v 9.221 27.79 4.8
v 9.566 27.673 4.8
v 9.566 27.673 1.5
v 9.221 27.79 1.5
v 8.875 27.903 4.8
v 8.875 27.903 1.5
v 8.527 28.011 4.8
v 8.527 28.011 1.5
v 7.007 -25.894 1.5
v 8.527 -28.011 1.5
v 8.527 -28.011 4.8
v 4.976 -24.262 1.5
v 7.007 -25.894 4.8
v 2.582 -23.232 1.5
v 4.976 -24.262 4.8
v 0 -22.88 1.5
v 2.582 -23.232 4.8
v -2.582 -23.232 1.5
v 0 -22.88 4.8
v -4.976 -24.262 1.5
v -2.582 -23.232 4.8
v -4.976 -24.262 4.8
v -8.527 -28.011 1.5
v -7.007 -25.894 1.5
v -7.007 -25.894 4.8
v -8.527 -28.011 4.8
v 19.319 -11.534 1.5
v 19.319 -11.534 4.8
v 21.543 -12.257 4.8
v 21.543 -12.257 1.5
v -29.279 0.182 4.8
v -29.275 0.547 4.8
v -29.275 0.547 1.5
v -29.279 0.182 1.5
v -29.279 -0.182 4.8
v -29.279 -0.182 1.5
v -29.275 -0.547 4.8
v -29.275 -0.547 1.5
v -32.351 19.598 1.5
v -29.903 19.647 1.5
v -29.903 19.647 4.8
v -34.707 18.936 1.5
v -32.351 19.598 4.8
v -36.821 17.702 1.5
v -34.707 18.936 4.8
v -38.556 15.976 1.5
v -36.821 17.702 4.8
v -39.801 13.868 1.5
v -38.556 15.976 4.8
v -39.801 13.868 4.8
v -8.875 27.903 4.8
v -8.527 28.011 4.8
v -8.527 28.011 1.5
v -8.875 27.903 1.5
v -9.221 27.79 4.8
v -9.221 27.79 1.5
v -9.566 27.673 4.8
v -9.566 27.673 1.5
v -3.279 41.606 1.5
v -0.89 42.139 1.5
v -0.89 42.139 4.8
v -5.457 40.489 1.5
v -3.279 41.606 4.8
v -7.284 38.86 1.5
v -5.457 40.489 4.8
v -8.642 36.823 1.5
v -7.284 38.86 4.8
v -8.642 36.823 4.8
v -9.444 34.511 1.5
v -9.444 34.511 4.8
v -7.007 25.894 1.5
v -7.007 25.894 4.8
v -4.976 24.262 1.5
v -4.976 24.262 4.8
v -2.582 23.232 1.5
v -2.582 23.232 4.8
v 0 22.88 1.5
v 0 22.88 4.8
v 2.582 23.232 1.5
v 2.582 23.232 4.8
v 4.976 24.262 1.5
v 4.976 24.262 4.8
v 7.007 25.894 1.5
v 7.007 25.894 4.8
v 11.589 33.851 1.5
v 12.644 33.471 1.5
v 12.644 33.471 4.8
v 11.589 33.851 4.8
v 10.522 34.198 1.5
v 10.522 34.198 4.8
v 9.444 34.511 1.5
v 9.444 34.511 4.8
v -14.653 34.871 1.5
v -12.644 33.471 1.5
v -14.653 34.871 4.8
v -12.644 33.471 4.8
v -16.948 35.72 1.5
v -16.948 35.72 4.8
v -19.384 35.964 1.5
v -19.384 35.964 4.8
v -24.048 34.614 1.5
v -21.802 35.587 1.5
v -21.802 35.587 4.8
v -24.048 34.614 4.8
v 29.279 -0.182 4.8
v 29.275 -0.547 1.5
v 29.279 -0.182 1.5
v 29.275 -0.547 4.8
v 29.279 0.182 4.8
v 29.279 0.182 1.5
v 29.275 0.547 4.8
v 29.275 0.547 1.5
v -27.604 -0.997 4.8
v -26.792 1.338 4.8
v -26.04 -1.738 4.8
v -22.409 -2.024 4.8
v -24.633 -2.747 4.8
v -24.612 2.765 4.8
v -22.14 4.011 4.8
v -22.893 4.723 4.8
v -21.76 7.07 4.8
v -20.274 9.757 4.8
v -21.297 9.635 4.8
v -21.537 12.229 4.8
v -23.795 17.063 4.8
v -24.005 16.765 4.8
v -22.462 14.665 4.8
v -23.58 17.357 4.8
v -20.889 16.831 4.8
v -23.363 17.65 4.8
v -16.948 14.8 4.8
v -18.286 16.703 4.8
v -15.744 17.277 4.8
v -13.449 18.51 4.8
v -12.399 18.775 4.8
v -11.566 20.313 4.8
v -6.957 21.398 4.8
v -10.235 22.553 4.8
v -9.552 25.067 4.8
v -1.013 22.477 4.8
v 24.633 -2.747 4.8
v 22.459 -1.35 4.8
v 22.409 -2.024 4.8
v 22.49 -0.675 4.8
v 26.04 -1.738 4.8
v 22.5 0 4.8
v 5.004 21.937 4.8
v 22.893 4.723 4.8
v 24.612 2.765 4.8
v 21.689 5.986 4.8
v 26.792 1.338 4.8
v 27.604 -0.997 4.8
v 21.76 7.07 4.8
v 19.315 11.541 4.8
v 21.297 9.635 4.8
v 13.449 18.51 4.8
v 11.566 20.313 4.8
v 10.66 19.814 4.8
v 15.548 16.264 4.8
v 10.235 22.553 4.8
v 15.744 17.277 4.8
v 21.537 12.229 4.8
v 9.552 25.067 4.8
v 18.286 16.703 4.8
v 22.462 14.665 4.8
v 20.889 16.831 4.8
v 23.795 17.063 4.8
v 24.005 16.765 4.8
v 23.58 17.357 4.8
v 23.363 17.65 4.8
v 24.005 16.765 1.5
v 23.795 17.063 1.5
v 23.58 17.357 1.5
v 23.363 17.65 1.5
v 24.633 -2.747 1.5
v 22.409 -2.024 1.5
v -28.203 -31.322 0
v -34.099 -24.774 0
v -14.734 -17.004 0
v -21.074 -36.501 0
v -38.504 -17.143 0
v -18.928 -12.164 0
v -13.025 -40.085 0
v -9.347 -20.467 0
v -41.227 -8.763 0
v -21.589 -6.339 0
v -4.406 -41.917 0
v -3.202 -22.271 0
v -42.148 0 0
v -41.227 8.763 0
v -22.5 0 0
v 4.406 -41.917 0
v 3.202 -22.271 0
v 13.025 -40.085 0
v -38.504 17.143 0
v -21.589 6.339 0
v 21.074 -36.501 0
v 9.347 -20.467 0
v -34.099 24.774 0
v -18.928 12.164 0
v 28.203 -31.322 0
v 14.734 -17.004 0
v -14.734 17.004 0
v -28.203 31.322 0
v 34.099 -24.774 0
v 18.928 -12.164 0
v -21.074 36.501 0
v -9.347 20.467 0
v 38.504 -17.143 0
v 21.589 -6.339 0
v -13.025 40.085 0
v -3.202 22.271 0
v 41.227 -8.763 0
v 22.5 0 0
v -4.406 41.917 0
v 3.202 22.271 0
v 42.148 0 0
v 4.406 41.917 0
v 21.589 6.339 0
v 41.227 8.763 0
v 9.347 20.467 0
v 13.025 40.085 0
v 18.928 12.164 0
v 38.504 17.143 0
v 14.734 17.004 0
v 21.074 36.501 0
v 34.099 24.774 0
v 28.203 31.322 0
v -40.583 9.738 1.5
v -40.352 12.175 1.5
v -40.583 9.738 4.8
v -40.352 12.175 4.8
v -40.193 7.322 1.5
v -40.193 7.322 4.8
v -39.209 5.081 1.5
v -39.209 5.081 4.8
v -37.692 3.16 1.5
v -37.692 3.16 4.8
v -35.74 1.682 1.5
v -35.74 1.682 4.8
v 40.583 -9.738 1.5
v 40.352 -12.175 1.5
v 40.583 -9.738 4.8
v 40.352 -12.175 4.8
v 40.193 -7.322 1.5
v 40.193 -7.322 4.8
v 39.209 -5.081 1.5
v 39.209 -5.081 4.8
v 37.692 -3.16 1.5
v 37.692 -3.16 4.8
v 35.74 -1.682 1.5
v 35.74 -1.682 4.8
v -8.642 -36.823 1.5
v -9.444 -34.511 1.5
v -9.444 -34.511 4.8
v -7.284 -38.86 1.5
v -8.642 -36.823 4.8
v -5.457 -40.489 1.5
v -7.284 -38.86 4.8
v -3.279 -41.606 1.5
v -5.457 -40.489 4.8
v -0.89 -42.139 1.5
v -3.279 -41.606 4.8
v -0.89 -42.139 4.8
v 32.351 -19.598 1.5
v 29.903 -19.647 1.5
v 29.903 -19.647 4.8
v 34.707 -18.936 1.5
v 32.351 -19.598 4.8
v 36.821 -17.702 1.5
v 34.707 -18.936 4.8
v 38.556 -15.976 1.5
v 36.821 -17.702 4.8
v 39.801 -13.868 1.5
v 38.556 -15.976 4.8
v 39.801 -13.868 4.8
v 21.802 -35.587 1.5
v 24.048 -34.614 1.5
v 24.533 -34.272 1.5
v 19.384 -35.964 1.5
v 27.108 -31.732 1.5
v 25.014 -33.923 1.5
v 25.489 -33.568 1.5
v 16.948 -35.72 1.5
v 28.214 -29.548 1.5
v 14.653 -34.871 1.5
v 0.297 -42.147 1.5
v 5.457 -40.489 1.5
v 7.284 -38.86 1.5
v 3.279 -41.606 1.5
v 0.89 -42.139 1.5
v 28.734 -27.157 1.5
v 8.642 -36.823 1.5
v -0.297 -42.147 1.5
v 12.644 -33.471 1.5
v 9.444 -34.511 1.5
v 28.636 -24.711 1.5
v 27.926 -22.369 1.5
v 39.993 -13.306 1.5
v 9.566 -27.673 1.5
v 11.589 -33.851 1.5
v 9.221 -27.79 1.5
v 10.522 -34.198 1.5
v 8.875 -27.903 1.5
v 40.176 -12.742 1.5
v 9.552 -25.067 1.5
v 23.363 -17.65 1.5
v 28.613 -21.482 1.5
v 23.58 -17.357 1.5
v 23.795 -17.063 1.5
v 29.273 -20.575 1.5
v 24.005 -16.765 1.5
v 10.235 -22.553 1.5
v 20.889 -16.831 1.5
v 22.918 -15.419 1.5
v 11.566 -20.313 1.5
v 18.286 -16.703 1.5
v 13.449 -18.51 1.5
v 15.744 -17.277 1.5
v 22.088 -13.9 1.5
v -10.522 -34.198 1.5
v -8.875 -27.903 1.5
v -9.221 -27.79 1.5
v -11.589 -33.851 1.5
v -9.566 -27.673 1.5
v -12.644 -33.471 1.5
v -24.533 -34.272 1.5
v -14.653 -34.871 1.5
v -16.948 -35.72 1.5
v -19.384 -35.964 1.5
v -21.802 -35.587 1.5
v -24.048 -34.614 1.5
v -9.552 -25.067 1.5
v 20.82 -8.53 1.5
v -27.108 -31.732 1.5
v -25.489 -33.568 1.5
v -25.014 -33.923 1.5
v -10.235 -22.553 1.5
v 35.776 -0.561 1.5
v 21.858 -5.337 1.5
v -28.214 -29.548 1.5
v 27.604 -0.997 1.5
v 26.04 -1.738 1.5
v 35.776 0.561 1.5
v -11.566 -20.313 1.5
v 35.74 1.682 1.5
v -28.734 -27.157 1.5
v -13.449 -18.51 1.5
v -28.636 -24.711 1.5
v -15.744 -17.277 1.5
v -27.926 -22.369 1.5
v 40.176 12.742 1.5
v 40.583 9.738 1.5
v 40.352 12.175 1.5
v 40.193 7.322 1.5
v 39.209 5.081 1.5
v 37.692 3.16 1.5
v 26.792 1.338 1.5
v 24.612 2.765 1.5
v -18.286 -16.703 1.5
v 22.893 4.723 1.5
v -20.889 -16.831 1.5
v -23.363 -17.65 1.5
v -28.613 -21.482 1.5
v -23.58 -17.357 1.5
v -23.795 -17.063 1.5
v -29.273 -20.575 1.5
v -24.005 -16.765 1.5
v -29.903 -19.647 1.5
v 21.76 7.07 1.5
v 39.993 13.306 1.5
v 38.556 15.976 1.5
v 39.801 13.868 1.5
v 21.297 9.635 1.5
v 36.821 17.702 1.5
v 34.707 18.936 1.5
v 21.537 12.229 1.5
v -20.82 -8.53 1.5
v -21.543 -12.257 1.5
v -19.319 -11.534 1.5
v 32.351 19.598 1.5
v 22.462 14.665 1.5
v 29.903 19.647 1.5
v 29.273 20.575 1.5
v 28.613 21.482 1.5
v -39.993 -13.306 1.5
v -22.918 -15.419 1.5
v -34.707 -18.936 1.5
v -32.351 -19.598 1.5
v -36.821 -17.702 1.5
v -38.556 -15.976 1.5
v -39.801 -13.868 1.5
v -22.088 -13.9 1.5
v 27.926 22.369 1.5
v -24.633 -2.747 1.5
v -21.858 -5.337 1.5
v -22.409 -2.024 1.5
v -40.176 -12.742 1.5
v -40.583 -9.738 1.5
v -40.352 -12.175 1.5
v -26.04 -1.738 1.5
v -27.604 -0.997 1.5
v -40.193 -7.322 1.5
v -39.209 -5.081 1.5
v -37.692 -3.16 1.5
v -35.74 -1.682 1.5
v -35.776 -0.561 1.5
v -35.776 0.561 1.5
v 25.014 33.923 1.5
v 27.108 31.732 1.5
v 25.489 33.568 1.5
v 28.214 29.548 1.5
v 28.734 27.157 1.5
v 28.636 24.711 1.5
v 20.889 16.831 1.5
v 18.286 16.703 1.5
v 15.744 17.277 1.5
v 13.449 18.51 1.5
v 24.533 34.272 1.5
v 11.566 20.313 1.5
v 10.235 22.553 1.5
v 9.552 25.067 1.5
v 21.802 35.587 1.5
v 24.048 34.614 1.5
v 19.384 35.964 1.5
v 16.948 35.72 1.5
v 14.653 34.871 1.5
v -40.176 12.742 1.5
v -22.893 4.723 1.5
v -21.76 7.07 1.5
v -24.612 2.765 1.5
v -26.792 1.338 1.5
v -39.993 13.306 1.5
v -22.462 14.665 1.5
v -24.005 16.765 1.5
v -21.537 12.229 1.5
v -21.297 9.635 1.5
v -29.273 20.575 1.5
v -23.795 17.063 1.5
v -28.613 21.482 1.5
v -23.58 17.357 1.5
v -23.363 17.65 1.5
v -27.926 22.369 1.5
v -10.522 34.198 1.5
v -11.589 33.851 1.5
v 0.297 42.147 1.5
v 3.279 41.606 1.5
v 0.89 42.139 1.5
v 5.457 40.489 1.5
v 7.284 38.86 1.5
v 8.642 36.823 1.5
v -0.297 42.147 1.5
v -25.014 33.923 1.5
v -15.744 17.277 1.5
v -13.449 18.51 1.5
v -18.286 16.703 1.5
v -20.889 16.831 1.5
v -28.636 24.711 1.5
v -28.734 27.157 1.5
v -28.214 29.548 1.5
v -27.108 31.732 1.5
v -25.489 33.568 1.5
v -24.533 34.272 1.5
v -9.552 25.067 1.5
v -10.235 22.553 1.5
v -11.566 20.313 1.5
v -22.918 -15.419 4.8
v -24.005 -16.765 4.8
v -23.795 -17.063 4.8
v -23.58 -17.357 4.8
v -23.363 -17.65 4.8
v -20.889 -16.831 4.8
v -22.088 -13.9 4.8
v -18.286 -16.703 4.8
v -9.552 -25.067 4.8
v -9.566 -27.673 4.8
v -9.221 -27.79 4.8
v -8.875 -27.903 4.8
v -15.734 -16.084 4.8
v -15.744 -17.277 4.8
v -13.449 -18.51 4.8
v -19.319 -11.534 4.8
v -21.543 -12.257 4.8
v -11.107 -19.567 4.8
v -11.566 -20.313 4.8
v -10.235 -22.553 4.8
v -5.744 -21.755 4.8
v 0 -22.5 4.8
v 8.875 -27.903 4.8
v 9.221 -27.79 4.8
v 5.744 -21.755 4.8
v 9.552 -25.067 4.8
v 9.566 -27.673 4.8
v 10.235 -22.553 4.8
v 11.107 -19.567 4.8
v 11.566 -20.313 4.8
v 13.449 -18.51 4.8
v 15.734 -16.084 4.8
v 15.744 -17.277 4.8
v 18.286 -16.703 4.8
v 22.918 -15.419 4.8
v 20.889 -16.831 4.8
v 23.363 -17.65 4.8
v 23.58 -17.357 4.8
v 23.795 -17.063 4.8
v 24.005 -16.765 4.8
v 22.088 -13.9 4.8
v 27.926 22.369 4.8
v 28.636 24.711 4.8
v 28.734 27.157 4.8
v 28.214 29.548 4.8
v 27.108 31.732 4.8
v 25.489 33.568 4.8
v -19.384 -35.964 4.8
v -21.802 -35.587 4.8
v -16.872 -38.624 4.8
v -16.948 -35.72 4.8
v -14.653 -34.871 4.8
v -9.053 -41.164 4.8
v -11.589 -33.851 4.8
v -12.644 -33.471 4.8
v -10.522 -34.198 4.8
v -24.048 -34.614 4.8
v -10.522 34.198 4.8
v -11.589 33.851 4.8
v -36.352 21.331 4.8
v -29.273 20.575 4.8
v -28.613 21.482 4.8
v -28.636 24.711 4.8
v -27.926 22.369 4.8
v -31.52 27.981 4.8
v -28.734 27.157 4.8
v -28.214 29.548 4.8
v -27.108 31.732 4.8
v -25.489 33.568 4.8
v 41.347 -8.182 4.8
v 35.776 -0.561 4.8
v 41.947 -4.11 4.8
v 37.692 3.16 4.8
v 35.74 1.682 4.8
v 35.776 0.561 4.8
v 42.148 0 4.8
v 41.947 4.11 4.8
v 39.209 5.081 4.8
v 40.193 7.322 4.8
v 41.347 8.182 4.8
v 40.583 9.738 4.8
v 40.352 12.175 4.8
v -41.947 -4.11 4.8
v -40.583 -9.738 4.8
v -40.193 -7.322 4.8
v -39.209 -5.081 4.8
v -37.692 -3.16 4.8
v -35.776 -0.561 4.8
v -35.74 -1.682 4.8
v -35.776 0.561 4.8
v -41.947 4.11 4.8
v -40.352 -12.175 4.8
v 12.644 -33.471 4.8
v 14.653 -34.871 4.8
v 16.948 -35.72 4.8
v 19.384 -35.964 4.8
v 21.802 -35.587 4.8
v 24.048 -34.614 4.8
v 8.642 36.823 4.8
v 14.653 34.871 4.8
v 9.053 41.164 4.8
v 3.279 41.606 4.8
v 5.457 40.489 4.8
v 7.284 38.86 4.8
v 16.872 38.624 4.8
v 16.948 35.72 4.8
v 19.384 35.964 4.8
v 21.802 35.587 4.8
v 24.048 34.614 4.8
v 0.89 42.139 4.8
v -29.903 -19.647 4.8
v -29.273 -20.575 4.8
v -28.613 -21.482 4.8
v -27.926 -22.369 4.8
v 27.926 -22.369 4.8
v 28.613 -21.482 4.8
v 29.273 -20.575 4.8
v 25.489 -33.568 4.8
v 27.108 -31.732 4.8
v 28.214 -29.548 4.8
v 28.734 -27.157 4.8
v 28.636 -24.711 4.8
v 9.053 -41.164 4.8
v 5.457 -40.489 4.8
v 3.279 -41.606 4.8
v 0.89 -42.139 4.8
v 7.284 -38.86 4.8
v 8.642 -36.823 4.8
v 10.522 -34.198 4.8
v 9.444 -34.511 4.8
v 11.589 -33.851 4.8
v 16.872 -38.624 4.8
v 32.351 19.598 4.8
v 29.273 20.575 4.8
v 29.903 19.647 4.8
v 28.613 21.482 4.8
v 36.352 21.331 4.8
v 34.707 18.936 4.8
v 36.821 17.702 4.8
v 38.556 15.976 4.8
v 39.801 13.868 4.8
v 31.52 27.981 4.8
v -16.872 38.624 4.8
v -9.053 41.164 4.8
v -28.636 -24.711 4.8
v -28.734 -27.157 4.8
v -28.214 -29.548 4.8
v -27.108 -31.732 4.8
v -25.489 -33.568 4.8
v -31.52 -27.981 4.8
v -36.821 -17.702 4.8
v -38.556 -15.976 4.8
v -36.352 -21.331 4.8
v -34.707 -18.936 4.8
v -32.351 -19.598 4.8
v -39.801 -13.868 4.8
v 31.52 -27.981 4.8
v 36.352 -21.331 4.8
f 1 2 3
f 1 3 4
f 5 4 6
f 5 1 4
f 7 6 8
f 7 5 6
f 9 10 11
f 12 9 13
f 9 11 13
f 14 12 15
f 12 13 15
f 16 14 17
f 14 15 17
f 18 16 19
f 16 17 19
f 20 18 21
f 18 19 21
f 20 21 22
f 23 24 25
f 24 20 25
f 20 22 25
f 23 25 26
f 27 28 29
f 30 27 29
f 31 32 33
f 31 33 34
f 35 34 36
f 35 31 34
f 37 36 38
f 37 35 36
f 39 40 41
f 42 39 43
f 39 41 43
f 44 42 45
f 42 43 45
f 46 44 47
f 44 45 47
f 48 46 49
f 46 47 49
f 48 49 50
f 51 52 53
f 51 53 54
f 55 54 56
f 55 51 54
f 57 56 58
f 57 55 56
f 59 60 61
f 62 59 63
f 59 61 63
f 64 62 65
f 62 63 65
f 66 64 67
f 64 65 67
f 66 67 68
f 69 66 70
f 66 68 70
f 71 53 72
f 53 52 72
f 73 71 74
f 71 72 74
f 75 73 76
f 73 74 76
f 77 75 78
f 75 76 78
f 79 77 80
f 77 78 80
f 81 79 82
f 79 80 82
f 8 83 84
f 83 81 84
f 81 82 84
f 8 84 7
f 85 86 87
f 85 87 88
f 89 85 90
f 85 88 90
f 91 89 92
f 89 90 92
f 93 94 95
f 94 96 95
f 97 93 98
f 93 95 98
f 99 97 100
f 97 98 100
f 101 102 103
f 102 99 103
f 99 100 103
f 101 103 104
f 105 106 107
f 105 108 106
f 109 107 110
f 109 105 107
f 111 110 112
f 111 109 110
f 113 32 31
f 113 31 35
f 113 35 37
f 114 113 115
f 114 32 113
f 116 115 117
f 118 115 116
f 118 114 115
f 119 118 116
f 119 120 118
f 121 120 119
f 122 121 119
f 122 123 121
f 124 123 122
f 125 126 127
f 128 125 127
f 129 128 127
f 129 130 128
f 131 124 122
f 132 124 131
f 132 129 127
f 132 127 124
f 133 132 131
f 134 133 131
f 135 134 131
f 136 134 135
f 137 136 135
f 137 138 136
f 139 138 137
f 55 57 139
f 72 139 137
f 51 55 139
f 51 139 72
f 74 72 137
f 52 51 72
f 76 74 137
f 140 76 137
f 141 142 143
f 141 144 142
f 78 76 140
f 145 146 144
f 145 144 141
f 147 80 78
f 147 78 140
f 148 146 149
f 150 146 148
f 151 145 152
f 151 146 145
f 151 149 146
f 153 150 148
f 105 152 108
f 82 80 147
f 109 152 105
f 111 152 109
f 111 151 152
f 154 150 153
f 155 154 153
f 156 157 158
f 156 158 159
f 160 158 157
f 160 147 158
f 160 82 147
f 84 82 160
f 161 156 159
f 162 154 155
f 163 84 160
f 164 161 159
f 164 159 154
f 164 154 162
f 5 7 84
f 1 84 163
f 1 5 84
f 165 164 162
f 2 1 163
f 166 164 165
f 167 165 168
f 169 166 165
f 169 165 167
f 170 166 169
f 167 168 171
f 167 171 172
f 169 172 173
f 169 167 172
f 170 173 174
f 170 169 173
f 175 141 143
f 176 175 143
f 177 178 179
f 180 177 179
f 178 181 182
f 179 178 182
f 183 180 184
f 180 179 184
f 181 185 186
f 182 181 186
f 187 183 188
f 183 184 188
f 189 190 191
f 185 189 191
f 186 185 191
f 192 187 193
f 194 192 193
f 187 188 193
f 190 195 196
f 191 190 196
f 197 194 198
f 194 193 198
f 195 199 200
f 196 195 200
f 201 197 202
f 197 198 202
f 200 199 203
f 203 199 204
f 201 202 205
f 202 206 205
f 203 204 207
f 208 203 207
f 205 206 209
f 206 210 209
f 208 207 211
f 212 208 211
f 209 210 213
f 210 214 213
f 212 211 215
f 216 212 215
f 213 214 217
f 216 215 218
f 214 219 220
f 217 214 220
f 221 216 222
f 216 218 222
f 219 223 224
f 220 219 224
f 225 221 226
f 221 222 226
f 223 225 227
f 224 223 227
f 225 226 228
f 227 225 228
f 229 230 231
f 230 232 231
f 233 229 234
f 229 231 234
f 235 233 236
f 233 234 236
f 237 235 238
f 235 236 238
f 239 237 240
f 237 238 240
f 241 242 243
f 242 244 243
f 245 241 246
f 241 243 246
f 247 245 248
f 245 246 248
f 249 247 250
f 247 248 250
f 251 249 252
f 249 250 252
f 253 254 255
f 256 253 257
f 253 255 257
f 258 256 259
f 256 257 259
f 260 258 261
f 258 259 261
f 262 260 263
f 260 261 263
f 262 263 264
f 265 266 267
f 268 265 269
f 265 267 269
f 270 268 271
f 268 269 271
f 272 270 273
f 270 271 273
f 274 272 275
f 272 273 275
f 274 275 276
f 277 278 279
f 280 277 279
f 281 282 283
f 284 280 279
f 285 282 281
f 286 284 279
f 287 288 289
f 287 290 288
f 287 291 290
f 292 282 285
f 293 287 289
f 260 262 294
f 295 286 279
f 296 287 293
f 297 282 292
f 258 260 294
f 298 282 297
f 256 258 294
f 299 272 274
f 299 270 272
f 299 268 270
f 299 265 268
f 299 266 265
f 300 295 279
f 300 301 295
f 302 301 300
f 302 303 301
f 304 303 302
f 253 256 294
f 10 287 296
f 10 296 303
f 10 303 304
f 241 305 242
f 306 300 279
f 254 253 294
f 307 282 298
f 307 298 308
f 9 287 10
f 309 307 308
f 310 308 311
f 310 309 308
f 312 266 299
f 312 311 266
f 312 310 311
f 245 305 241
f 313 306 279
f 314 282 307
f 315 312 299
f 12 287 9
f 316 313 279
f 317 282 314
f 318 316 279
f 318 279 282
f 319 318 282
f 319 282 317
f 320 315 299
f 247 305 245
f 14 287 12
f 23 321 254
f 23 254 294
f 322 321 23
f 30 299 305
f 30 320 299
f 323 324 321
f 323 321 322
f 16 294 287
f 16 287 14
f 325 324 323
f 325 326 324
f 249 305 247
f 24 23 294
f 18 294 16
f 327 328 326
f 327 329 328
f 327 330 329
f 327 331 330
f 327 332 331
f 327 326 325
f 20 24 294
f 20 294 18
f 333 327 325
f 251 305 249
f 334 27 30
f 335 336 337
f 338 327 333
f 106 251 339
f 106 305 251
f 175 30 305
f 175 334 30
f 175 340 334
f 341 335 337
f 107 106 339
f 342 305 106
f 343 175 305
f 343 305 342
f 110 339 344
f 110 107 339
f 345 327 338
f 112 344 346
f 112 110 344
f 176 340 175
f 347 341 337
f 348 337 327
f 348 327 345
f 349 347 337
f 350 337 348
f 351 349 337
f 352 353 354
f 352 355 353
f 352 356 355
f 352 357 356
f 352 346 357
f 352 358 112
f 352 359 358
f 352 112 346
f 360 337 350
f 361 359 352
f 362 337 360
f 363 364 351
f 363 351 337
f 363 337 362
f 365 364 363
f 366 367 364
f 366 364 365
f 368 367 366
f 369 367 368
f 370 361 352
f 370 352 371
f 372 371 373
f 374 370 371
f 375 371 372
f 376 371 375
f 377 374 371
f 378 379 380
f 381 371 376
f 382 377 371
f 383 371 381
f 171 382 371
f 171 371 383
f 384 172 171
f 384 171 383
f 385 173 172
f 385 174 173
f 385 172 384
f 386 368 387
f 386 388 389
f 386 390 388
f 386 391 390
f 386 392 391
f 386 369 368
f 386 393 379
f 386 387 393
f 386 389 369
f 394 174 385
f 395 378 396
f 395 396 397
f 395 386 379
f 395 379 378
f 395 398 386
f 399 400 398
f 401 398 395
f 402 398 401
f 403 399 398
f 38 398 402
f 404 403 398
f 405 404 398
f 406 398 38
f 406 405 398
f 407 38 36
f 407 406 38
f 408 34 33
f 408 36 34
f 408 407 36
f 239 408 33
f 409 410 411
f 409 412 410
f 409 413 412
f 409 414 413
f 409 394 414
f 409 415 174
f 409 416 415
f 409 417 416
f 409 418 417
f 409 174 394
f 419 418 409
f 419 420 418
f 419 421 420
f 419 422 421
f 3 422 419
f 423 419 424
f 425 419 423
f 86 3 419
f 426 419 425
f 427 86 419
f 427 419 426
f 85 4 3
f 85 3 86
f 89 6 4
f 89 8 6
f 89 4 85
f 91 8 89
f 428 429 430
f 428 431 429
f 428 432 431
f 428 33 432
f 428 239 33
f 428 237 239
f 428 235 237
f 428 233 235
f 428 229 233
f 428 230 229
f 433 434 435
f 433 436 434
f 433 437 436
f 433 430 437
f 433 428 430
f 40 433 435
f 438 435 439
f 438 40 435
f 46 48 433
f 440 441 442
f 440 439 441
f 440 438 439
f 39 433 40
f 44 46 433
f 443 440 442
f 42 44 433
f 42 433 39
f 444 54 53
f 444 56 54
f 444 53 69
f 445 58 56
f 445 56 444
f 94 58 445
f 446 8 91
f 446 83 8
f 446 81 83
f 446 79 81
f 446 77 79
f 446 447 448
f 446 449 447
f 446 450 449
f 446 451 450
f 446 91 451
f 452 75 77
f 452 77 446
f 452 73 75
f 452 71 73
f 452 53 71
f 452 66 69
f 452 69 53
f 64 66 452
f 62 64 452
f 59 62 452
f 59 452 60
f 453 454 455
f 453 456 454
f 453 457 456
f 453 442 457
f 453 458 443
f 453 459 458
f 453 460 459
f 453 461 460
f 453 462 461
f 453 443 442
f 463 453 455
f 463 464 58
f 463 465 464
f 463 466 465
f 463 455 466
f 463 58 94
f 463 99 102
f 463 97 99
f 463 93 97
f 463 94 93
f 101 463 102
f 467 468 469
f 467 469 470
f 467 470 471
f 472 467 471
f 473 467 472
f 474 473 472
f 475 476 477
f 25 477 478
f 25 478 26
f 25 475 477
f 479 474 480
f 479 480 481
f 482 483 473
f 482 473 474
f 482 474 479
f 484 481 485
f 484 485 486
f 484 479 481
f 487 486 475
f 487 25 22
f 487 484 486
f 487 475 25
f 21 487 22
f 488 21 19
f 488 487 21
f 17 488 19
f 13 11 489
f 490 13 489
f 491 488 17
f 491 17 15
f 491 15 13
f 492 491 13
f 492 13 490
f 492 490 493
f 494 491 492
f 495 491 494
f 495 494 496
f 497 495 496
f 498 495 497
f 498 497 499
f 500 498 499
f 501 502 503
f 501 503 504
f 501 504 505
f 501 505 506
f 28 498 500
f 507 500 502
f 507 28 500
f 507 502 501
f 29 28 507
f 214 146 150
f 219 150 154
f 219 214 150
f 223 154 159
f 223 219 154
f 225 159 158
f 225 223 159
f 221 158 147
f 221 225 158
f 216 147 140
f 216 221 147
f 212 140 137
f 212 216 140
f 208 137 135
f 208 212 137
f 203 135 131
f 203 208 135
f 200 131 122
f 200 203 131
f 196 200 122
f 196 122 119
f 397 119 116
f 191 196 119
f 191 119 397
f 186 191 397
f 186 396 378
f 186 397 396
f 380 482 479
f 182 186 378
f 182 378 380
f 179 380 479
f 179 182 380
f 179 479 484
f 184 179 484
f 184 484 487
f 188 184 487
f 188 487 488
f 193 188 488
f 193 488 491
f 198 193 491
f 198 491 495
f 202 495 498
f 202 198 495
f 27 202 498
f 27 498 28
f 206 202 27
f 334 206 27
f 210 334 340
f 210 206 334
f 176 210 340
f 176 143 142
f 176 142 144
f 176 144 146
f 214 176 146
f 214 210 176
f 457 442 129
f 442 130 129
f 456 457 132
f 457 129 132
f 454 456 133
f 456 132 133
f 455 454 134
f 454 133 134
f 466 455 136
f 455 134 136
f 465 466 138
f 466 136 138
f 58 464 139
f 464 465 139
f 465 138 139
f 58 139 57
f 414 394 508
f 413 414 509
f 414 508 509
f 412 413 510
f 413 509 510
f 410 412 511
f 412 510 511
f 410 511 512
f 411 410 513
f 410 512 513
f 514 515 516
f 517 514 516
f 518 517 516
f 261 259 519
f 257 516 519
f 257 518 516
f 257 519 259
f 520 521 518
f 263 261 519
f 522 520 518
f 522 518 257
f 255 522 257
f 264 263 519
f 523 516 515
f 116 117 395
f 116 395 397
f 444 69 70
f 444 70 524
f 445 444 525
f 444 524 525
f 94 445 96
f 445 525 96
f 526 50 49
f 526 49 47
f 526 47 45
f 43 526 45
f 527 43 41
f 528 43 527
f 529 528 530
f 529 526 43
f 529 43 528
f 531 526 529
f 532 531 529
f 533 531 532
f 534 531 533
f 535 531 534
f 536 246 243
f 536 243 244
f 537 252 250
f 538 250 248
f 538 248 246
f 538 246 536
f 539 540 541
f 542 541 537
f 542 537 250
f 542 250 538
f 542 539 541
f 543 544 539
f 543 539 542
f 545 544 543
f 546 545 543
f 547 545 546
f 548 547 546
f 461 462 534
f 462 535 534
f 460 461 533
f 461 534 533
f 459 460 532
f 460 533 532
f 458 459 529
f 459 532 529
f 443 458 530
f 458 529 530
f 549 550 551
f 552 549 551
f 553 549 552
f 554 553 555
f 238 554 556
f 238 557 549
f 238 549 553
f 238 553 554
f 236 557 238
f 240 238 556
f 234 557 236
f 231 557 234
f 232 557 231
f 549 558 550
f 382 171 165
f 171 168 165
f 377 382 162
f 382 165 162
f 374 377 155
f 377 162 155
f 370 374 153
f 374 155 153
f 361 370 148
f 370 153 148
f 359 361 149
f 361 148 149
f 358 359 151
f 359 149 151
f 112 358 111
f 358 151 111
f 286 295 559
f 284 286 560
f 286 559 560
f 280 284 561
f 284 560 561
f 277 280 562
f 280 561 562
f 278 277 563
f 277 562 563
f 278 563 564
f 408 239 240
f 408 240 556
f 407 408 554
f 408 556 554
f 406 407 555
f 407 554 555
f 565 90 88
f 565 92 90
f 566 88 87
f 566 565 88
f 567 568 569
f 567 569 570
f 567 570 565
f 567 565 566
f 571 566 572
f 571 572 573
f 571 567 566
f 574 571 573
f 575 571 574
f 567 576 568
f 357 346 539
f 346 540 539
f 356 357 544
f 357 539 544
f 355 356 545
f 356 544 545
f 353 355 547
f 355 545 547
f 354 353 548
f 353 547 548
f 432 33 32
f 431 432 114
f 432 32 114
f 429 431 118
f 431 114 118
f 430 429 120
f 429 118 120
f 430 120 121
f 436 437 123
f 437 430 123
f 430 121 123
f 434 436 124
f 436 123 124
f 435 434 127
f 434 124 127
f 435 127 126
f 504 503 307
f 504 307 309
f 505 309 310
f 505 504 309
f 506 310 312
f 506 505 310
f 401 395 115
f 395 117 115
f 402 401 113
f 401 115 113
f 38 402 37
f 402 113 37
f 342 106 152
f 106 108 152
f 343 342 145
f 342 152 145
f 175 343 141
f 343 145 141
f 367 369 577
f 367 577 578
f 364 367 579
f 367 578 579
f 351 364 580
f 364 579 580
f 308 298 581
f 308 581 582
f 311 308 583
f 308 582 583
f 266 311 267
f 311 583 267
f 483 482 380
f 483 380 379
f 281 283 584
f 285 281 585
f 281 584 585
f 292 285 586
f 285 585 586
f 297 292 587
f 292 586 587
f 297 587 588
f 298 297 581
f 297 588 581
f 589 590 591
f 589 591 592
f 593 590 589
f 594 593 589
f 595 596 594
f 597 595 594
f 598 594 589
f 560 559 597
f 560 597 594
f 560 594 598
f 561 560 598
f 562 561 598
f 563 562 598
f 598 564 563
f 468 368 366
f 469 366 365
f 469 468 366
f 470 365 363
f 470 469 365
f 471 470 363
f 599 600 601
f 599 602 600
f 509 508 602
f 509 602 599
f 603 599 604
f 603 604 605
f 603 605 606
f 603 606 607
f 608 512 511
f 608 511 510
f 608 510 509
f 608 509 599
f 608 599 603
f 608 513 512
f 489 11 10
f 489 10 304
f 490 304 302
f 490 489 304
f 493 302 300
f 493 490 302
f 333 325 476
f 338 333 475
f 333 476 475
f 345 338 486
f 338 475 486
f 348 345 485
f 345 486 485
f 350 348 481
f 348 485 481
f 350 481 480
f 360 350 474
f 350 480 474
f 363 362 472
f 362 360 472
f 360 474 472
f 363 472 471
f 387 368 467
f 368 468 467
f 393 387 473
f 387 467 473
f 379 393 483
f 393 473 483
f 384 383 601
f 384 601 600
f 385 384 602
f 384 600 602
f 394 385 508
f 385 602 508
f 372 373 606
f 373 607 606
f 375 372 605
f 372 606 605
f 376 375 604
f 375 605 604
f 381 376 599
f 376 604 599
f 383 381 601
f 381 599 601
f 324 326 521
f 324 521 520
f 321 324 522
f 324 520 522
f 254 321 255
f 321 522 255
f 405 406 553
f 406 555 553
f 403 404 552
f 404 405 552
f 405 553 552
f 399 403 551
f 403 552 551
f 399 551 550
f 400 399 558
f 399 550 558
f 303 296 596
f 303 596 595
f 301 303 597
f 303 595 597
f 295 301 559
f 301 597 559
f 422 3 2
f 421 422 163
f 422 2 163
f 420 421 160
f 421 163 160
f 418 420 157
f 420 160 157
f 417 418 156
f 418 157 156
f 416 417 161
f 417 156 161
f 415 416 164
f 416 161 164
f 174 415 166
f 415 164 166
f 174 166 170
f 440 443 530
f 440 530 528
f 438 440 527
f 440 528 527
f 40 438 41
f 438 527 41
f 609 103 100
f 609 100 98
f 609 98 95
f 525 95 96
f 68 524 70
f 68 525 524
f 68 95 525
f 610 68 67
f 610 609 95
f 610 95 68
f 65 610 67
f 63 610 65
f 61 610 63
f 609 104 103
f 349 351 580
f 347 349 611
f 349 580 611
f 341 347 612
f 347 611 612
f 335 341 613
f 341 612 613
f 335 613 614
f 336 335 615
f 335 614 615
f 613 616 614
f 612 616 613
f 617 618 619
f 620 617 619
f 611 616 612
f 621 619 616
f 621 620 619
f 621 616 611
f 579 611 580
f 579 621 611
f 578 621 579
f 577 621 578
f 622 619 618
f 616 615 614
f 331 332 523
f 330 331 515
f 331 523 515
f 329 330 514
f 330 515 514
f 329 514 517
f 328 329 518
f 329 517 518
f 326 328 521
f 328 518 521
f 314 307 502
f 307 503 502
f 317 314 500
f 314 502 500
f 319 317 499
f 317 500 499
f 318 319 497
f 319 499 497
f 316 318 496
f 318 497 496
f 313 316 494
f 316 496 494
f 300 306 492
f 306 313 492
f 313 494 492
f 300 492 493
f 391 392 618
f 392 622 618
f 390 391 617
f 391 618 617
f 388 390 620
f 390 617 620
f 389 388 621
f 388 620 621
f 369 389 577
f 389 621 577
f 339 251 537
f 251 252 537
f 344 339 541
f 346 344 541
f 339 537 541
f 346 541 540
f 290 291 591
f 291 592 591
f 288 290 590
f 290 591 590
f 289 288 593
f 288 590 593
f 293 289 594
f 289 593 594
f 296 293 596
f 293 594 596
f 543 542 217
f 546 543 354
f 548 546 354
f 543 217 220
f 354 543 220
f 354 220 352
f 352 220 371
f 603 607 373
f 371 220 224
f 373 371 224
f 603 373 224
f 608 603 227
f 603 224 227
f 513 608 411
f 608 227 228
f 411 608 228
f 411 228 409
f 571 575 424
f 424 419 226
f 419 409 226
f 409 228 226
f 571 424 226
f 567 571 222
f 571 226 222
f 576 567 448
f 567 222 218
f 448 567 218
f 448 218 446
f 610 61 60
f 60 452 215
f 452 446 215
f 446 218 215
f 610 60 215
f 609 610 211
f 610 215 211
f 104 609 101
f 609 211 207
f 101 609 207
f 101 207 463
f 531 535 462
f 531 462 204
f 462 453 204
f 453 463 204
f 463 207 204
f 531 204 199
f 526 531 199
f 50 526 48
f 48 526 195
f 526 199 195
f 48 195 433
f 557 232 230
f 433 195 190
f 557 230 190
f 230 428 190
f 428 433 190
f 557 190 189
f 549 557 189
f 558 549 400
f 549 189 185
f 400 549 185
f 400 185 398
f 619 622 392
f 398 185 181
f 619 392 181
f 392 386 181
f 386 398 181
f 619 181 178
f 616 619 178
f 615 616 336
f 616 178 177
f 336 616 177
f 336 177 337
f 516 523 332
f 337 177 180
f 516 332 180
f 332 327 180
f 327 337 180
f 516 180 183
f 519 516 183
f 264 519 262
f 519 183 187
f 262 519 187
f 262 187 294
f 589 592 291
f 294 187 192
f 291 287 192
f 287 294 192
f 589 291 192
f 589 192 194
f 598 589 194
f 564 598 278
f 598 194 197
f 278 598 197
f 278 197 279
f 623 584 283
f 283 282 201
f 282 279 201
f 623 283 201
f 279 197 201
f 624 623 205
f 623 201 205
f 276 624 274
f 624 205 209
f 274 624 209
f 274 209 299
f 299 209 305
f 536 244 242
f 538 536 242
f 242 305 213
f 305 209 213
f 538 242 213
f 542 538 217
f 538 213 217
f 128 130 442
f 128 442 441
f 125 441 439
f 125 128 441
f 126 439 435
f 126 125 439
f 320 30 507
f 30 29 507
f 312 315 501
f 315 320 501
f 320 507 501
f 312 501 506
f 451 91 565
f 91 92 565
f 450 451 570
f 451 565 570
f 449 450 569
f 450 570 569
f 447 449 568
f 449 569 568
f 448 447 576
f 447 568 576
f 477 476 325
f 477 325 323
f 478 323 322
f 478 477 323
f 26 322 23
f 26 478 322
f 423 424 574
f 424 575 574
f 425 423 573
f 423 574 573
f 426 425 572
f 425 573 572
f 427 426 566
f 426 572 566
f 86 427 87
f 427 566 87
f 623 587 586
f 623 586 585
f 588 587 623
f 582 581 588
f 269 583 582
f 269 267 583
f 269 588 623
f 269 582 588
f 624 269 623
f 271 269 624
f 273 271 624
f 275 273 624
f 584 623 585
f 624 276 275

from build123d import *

# Parameters (mm, degrees)
SKETCH1_R                  = 42.14825
SKETCH1_R_2                = 22.5
BASIC_SHAPE_DEPTH          = 4.8
SKETCH2_R                  = 9.65
BATTERY_SLOT_DEPTH         = 3.3
BATTERY_SLOT_PATTERN_COUNT = 10
SKETCH3_R                  = 35.78
SKETCH3_R_2                = 29.28
BUS_SLOT_DEPTH             = 3.3
WIRE_SLIT_DEPTH            = 3.3


with BuildPart() as part:
    # Sketch1 → Basic Shape (new body)
    with BuildSketch(Plane.XY):
        Circle(SKETCH1_R)
        Circle(SKETCH1_R_2, mode=Mode.SUBTRACT)
    extrude(amount=BASIC_SHAPE_DEPTH)

    # Sketch2 → Battery Slot (cut)
    with BuildSketch(Plane.XY.offset(4.8)):
        with Locations((0, -32.53)):
            Circle(SKETCH2_R)
    battery_slot = extrude(amount=-BATTERY_SLOT_DEPTH, mode=Mode.SUBTRACT)

    # Battery Slot Pattern: Battery Slot ×10 about axis
    battery_slot_pattern_axis = Axis((0, 0, 0), (0, 0, 1))
    for i in range(1, BATTERY_SLOT_PATTERN_COUNT):
        add(battery_slot.rotate(battery_slot_pattern_axis, i * 360 / BATTERY_SLOT_PATTERN_COUNT), mode=Mode.SUBTRACT)

    # Sketch3 → Bus Slot (cut)
    with BuildSketch(Plane.XY.offset(4.8)):
        Circle(SKETCH3_R)
        Circle(SKETCH3_R_2, mode=Mode.SUBTRACT)
    extrude(amount=-BUS_SLOT_DEPTH, mode=Mode.SUBTRACT)

    # Sketch4 → Wire Slit (cut)
    with BuildSketch(Plane.XY.offset(4.8)):
        with BuildLine():
            Line((-24.633279562, -2.746526591), (-19.877996981, -1.201441619))
            Line((-19.877996981, -1.201441619), (-16.787827037, -10.712006782))
            Line((-16.787827037, -10.712006782), (-21.543109618, -12.257091754))
            ThreePointArc((-21.543109618, -12.257091754), (-21.760173093, -7.070308831), (-24.633279562, -2.746526591))
        make_face()
    wire_slit = extrude(amount=-WIRE_SLIT_DEPTH, mode=Mode.SUBTRACT)

    # Wire Slit Mirror: Wire Slit across plane
    add(wire_slit.mirror(Plane(origin=(0, 0, 0), x_dir=(0, 0, 1), z_dir=(1, 0, 0))), mode=Mode.SUBTRACT)


solid = part.part
